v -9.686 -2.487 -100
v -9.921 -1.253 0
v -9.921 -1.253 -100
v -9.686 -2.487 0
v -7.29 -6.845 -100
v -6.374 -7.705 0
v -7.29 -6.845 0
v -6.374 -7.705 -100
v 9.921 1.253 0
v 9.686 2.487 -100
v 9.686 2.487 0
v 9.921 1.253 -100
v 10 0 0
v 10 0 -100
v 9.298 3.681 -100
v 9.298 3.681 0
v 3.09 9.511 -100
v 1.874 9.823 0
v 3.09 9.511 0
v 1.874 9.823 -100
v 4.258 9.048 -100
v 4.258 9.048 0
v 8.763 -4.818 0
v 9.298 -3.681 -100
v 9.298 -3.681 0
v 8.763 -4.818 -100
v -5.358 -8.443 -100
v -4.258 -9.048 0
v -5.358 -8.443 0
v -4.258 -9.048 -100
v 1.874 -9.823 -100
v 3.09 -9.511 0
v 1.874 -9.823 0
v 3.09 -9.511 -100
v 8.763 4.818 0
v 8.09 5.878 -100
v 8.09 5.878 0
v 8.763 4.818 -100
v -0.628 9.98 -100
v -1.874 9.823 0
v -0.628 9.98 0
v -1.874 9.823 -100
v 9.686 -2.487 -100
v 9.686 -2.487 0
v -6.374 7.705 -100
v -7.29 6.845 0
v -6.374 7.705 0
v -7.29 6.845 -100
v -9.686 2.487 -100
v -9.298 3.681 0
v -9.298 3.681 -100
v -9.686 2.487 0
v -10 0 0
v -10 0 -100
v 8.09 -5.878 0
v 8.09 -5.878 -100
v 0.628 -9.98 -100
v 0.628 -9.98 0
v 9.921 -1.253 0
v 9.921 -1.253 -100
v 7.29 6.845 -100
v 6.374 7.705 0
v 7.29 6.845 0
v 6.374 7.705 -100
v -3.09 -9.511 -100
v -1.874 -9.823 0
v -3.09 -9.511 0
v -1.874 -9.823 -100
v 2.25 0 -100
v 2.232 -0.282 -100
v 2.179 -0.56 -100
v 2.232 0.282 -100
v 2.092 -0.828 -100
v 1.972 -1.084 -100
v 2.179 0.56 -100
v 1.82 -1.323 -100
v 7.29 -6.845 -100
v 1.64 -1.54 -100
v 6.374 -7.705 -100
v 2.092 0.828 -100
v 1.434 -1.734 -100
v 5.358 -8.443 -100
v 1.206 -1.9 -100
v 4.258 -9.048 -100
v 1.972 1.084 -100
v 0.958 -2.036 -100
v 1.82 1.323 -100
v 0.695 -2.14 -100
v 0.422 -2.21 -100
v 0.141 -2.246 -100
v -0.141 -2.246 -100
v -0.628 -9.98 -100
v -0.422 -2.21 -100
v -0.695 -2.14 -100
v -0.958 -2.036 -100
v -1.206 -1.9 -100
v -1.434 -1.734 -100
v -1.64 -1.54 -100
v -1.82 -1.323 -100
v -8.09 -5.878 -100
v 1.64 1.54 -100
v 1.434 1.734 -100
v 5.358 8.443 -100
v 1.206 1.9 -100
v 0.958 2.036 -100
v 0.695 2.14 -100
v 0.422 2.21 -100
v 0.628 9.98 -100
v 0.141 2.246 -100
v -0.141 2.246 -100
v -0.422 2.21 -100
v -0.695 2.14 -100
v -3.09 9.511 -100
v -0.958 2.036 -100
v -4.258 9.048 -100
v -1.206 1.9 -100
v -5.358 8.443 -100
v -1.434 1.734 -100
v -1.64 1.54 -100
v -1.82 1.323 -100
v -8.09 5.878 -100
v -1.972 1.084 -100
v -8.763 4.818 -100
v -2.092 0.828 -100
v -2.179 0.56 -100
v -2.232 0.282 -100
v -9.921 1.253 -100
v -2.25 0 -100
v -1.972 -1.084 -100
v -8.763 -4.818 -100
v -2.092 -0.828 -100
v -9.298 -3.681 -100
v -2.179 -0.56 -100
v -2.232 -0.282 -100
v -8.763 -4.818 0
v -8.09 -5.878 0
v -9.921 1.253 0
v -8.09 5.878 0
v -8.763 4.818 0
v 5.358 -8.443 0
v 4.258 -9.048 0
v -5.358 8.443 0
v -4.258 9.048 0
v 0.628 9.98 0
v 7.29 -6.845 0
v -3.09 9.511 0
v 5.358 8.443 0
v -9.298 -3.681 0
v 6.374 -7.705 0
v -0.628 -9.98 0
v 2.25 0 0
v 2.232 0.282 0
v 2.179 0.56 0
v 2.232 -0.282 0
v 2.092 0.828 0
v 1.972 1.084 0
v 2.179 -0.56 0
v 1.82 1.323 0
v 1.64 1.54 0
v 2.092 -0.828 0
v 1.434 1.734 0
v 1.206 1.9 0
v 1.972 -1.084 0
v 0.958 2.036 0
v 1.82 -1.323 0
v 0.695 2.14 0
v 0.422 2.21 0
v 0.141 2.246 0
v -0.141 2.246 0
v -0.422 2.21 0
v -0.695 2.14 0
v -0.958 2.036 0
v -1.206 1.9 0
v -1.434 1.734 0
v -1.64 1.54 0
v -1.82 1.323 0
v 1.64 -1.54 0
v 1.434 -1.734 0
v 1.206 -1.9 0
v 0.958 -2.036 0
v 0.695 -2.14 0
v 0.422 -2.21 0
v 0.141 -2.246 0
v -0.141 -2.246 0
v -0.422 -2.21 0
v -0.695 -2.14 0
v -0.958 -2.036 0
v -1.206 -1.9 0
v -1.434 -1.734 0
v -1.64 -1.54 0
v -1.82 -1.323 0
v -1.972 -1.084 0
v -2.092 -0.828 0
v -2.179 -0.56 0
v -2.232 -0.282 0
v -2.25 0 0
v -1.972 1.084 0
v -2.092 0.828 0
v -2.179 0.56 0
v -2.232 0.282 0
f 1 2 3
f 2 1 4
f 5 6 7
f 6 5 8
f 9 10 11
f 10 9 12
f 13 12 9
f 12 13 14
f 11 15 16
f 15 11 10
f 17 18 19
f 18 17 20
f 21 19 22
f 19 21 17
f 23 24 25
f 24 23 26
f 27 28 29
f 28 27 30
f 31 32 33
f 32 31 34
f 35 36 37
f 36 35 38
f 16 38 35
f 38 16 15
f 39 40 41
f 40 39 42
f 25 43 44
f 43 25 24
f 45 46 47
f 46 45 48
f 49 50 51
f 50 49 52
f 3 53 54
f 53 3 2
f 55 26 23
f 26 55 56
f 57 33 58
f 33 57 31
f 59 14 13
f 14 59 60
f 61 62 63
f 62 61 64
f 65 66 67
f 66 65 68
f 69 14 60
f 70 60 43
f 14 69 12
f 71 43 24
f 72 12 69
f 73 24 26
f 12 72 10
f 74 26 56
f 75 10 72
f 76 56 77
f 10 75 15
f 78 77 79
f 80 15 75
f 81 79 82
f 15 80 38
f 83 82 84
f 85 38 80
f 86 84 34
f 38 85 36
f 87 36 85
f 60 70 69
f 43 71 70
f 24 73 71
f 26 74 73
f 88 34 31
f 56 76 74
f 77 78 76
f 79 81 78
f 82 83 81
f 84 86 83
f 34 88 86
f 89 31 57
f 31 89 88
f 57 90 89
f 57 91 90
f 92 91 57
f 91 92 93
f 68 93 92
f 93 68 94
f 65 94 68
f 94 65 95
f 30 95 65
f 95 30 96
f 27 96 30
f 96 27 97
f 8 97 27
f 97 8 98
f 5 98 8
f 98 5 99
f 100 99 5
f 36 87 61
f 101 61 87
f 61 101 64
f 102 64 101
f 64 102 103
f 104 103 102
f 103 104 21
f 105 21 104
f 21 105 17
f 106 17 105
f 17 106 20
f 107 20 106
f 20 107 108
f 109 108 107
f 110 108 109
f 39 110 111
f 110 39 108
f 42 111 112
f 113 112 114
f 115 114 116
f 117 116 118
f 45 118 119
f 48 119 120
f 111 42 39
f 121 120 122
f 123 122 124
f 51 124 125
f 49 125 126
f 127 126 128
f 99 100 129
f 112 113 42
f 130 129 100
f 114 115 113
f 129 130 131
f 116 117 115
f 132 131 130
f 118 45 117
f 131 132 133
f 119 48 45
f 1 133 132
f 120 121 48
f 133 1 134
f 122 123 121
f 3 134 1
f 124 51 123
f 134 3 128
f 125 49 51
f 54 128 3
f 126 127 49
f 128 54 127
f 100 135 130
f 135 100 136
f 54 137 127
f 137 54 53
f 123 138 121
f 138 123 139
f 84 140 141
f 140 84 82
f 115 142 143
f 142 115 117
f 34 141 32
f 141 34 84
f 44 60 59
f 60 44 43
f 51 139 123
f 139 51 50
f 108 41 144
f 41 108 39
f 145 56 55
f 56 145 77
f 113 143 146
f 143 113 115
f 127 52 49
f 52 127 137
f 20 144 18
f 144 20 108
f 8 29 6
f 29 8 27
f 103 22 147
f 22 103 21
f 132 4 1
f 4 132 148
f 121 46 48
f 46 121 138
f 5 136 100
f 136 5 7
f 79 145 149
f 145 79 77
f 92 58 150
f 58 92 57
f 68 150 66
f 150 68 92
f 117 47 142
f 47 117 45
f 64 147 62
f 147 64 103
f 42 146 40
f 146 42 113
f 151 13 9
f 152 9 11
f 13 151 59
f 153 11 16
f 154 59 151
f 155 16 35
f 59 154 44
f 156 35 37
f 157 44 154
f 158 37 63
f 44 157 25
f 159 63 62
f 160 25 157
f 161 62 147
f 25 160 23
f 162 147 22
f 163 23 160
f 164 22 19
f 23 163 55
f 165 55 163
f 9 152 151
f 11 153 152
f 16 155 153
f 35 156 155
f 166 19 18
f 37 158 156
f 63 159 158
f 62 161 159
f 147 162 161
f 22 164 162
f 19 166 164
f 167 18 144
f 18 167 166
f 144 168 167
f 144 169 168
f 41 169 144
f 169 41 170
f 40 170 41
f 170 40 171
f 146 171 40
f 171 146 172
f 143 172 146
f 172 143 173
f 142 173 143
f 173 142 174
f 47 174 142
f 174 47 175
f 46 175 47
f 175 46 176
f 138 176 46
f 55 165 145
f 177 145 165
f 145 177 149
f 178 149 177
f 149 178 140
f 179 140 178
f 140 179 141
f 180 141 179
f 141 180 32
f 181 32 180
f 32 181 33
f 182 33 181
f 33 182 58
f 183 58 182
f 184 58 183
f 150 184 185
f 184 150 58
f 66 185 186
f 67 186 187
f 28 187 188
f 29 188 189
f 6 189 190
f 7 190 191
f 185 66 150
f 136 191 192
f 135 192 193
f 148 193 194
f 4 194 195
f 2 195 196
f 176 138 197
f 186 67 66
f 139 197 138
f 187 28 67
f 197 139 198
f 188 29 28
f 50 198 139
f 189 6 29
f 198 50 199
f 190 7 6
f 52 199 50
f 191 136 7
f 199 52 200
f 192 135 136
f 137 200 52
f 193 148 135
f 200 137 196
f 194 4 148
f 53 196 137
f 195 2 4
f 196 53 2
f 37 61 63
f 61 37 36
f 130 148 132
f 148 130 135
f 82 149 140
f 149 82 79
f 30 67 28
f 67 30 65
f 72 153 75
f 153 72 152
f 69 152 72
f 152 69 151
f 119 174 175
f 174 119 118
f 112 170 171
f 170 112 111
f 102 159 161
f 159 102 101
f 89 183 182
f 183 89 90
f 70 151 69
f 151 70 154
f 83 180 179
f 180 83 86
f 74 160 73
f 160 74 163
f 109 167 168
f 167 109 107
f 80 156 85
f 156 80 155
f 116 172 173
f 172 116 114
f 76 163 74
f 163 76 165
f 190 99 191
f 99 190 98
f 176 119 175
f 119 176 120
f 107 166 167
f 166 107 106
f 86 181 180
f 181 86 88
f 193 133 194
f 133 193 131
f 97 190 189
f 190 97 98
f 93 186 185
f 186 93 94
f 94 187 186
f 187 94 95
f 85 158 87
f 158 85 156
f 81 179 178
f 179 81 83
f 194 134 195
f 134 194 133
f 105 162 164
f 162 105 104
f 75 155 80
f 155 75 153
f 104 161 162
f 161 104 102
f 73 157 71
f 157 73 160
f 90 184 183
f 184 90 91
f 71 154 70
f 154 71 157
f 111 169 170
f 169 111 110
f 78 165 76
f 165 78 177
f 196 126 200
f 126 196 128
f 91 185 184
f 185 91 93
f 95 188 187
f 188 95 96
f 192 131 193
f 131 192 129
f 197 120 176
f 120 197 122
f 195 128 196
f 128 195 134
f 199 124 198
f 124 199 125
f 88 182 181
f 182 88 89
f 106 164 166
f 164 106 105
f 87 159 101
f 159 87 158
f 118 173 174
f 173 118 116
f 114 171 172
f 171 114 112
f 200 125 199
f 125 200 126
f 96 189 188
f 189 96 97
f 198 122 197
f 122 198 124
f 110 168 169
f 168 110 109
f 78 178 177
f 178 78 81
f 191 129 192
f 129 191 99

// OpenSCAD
$fn = 50;


difference() {
	union() {
		translate(v = [0, 0, -100.0000000000]) {
			cylinder(h = 100, r = 10.0000000000);
		}
		cylinder(h = 0, r = 16.0000000000);
	}
	union() {
		#translate(v = [0, 0, -100]) {
			cylinder(h = 100, r = 2.2500000000);
		}
	}
}
